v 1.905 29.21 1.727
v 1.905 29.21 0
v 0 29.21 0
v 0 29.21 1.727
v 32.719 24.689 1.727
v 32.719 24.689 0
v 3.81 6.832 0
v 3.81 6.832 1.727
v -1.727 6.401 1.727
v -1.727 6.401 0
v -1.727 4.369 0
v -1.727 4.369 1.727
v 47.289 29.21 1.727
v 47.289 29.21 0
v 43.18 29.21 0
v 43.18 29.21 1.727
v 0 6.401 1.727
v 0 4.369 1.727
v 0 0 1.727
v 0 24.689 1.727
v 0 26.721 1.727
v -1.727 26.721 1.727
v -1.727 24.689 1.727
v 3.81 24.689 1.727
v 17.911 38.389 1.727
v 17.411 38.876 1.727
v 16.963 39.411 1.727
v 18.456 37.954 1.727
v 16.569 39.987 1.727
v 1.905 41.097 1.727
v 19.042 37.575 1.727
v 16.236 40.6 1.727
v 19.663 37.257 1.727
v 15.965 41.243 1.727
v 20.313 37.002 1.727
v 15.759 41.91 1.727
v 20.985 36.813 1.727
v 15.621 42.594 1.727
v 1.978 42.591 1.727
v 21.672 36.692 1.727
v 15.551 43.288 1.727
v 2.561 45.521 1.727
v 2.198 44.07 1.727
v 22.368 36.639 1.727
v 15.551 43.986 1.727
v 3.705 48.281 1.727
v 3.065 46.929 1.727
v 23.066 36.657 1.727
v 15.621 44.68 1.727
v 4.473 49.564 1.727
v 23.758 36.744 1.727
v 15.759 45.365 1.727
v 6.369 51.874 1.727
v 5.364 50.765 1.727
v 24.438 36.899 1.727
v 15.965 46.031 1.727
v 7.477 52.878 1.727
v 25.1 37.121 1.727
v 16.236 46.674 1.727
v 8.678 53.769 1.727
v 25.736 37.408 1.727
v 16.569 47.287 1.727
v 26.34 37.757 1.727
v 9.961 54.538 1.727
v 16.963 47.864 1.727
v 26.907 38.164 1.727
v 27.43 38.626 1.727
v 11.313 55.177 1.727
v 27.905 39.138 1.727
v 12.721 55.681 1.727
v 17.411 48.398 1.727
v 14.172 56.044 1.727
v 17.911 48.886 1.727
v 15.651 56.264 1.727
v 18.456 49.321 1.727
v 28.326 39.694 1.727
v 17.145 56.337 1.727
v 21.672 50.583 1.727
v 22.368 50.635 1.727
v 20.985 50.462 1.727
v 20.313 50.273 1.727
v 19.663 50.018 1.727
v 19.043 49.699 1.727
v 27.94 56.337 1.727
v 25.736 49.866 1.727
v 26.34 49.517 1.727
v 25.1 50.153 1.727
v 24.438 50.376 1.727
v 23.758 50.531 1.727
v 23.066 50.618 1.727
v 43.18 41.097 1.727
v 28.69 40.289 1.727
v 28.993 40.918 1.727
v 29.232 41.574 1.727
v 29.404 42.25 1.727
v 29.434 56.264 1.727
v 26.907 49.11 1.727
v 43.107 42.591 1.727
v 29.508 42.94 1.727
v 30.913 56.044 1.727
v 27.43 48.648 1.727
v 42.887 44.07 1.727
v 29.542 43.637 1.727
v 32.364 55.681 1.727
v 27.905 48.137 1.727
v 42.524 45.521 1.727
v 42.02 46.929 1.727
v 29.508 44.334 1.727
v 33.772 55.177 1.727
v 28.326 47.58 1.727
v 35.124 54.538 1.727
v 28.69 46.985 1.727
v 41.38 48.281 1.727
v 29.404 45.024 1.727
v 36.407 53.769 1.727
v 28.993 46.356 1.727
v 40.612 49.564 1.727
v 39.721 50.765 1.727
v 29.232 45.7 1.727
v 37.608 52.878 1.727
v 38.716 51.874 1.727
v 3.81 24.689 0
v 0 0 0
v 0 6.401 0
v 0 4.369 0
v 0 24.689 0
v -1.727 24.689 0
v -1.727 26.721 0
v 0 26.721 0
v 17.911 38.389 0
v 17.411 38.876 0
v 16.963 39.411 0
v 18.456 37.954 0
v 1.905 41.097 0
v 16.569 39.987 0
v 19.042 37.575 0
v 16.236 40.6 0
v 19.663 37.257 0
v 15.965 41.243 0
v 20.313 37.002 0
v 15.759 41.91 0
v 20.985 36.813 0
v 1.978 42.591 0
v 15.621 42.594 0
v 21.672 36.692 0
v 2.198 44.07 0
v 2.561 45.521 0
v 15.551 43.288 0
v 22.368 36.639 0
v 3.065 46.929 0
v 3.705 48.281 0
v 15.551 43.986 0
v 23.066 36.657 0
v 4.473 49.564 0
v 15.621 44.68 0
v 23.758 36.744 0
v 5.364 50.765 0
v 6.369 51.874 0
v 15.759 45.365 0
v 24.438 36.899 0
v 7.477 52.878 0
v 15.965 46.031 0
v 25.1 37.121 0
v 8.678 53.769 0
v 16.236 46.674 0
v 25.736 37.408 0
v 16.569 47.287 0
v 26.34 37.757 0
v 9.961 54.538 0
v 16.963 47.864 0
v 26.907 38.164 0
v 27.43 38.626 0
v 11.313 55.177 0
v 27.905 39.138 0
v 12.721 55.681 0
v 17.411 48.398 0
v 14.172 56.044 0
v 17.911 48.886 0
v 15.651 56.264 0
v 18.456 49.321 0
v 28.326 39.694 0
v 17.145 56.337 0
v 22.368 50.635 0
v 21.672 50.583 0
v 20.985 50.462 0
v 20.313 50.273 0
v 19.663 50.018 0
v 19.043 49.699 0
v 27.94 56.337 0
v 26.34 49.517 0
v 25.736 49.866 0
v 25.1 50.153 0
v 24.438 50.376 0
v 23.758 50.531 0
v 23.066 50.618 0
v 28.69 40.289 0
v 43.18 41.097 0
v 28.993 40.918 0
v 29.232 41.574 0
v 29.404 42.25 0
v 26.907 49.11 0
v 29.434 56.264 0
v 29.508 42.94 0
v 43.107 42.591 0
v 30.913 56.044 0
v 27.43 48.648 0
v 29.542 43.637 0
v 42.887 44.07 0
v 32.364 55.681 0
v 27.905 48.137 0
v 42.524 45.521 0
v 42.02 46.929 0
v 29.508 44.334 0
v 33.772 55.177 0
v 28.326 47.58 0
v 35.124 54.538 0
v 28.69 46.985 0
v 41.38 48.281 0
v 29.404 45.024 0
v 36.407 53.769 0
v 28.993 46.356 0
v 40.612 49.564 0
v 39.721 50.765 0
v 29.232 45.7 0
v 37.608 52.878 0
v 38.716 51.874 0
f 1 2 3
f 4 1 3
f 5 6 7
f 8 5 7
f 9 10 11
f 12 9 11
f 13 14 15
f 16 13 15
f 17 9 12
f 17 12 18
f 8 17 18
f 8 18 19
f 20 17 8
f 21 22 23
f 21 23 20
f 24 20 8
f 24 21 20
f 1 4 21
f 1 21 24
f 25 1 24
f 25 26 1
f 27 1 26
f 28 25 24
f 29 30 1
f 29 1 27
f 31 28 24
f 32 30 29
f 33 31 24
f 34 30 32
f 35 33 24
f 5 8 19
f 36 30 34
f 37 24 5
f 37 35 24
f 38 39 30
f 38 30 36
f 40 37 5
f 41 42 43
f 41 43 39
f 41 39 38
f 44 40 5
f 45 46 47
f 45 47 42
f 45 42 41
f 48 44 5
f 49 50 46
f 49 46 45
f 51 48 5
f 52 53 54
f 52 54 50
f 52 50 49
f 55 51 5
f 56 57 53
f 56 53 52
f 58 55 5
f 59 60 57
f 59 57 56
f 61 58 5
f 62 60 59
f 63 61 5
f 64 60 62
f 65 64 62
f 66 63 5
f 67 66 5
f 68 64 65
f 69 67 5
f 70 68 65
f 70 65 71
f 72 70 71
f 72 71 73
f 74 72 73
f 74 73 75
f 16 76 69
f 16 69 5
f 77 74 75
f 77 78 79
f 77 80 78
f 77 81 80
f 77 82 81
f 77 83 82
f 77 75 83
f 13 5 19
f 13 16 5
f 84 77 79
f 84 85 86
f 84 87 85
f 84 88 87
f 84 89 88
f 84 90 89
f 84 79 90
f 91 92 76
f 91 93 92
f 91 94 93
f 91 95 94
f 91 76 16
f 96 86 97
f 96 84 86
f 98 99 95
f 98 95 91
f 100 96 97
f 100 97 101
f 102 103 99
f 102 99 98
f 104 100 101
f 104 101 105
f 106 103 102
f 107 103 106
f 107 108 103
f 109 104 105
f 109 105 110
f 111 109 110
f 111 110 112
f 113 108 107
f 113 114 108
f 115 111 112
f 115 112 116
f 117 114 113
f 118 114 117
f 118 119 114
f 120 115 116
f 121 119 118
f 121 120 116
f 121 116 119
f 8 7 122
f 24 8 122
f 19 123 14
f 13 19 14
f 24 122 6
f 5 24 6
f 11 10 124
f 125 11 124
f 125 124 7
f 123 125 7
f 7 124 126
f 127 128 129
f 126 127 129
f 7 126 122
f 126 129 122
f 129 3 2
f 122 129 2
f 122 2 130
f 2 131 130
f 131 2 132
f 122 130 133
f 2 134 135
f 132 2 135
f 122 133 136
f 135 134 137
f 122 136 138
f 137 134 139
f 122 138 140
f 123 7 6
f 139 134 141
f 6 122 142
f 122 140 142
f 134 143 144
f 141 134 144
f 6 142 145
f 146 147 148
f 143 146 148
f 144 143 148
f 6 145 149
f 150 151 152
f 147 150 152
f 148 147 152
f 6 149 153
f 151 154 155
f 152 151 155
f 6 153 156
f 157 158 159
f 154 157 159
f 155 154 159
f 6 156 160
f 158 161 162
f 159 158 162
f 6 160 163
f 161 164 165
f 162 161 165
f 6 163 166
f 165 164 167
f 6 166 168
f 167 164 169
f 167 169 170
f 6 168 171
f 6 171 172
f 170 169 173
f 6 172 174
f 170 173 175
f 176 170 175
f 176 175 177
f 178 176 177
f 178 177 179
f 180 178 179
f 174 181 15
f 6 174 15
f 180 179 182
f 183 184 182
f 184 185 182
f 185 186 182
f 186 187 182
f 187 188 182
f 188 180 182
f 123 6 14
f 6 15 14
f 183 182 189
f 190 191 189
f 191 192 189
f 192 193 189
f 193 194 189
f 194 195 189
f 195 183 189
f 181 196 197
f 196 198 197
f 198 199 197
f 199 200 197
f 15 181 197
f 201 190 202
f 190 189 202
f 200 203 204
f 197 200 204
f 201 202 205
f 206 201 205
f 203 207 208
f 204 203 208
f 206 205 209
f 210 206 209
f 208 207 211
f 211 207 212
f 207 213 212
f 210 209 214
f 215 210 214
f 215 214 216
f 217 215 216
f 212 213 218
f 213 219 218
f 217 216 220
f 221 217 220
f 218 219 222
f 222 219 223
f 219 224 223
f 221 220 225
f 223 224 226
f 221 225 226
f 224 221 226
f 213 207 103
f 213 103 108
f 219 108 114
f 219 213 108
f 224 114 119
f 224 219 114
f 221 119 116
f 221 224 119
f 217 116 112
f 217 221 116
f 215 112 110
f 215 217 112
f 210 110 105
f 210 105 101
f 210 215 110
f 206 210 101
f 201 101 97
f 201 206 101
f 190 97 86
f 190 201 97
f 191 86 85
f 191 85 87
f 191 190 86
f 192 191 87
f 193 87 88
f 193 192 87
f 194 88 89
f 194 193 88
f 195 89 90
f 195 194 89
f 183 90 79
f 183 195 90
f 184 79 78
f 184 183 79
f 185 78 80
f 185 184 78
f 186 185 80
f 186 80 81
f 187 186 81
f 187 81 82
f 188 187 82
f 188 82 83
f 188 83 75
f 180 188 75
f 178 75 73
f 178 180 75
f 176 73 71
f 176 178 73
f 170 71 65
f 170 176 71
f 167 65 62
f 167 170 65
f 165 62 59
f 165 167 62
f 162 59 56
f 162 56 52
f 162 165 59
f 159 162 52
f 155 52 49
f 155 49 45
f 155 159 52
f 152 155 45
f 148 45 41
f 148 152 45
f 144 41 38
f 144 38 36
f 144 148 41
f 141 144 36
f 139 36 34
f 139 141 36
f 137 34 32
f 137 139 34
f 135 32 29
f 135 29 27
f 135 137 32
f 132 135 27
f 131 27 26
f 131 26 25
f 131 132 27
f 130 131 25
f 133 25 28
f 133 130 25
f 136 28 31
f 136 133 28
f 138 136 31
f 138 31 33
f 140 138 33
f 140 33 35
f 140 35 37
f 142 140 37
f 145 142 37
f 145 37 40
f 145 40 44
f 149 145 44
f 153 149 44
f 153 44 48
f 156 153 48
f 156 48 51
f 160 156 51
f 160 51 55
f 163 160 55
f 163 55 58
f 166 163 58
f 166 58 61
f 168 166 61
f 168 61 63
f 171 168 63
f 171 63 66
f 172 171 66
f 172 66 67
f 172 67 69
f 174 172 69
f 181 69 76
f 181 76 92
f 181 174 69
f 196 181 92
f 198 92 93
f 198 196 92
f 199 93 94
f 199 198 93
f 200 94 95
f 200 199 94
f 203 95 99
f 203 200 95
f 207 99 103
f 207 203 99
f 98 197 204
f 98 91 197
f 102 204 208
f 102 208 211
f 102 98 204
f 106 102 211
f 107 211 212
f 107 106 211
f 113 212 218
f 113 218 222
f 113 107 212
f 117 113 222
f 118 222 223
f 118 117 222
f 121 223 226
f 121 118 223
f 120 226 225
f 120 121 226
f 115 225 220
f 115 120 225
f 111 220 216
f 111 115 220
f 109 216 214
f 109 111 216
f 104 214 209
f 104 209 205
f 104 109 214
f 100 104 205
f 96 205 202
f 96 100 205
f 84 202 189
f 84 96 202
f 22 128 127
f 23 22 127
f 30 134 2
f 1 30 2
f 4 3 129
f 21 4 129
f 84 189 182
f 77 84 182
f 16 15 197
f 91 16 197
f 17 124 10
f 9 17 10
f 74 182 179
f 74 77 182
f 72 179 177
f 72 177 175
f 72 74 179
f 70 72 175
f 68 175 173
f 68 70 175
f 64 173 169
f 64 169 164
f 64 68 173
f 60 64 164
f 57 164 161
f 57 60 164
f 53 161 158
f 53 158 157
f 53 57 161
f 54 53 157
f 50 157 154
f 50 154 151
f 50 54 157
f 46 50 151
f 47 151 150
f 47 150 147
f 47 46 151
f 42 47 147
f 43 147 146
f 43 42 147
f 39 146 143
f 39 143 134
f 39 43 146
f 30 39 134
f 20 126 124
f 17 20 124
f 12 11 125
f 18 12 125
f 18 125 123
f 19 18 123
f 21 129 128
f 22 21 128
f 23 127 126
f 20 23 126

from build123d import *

# Parameters (mm, degrees)
SKETCH1_R           = 7
BOSS_EXTRUDE1_DEPTH = 1.7272
FILLET7_R           = 15.24


with BuildPart() as part:
    # Sketch1 → Boss-Extrude1 (new body)
    with BuildSketch(Plane.XY):
        Polygon((0, 0), (47.288728977, 29.21), (43.18, 29.21), (43.18, 56.3372), (1.905, 56.3372), (1.905, 29.21), (0, 29.21), (0, 26.7208), (-1.7272, 26.7208), (-1.7272, 24.6888), (0, 24.6888), (0, 6.4008), (-1.7272, 6.4008), (-1.7272, 4.3688), (0, 4.3688), align=None)
        with Locations((22.5425, 43.6372)):
            Circle(SKETCH1_R, mode=Mode.SUBTRACT)
        Polygon((3.81, 24.6888), (32.719325319, 24.6888), (3.81, 6.831661294), align=None, mode=Mode.SUBTRACT)
    extrude(amount=BOSS_EXTRUDE1_DEPTH)

    # Fillet7
    fillet7_edges = [part.edges().sort_by_distance(p)[0] for p in [
        (1.905, 56.3372, 0.8636),
        (43.18, 56.3372, 0.8636),
    ]]
    fillet(fillet7_edges, radius=FILLET7_R)


solid = part.part
